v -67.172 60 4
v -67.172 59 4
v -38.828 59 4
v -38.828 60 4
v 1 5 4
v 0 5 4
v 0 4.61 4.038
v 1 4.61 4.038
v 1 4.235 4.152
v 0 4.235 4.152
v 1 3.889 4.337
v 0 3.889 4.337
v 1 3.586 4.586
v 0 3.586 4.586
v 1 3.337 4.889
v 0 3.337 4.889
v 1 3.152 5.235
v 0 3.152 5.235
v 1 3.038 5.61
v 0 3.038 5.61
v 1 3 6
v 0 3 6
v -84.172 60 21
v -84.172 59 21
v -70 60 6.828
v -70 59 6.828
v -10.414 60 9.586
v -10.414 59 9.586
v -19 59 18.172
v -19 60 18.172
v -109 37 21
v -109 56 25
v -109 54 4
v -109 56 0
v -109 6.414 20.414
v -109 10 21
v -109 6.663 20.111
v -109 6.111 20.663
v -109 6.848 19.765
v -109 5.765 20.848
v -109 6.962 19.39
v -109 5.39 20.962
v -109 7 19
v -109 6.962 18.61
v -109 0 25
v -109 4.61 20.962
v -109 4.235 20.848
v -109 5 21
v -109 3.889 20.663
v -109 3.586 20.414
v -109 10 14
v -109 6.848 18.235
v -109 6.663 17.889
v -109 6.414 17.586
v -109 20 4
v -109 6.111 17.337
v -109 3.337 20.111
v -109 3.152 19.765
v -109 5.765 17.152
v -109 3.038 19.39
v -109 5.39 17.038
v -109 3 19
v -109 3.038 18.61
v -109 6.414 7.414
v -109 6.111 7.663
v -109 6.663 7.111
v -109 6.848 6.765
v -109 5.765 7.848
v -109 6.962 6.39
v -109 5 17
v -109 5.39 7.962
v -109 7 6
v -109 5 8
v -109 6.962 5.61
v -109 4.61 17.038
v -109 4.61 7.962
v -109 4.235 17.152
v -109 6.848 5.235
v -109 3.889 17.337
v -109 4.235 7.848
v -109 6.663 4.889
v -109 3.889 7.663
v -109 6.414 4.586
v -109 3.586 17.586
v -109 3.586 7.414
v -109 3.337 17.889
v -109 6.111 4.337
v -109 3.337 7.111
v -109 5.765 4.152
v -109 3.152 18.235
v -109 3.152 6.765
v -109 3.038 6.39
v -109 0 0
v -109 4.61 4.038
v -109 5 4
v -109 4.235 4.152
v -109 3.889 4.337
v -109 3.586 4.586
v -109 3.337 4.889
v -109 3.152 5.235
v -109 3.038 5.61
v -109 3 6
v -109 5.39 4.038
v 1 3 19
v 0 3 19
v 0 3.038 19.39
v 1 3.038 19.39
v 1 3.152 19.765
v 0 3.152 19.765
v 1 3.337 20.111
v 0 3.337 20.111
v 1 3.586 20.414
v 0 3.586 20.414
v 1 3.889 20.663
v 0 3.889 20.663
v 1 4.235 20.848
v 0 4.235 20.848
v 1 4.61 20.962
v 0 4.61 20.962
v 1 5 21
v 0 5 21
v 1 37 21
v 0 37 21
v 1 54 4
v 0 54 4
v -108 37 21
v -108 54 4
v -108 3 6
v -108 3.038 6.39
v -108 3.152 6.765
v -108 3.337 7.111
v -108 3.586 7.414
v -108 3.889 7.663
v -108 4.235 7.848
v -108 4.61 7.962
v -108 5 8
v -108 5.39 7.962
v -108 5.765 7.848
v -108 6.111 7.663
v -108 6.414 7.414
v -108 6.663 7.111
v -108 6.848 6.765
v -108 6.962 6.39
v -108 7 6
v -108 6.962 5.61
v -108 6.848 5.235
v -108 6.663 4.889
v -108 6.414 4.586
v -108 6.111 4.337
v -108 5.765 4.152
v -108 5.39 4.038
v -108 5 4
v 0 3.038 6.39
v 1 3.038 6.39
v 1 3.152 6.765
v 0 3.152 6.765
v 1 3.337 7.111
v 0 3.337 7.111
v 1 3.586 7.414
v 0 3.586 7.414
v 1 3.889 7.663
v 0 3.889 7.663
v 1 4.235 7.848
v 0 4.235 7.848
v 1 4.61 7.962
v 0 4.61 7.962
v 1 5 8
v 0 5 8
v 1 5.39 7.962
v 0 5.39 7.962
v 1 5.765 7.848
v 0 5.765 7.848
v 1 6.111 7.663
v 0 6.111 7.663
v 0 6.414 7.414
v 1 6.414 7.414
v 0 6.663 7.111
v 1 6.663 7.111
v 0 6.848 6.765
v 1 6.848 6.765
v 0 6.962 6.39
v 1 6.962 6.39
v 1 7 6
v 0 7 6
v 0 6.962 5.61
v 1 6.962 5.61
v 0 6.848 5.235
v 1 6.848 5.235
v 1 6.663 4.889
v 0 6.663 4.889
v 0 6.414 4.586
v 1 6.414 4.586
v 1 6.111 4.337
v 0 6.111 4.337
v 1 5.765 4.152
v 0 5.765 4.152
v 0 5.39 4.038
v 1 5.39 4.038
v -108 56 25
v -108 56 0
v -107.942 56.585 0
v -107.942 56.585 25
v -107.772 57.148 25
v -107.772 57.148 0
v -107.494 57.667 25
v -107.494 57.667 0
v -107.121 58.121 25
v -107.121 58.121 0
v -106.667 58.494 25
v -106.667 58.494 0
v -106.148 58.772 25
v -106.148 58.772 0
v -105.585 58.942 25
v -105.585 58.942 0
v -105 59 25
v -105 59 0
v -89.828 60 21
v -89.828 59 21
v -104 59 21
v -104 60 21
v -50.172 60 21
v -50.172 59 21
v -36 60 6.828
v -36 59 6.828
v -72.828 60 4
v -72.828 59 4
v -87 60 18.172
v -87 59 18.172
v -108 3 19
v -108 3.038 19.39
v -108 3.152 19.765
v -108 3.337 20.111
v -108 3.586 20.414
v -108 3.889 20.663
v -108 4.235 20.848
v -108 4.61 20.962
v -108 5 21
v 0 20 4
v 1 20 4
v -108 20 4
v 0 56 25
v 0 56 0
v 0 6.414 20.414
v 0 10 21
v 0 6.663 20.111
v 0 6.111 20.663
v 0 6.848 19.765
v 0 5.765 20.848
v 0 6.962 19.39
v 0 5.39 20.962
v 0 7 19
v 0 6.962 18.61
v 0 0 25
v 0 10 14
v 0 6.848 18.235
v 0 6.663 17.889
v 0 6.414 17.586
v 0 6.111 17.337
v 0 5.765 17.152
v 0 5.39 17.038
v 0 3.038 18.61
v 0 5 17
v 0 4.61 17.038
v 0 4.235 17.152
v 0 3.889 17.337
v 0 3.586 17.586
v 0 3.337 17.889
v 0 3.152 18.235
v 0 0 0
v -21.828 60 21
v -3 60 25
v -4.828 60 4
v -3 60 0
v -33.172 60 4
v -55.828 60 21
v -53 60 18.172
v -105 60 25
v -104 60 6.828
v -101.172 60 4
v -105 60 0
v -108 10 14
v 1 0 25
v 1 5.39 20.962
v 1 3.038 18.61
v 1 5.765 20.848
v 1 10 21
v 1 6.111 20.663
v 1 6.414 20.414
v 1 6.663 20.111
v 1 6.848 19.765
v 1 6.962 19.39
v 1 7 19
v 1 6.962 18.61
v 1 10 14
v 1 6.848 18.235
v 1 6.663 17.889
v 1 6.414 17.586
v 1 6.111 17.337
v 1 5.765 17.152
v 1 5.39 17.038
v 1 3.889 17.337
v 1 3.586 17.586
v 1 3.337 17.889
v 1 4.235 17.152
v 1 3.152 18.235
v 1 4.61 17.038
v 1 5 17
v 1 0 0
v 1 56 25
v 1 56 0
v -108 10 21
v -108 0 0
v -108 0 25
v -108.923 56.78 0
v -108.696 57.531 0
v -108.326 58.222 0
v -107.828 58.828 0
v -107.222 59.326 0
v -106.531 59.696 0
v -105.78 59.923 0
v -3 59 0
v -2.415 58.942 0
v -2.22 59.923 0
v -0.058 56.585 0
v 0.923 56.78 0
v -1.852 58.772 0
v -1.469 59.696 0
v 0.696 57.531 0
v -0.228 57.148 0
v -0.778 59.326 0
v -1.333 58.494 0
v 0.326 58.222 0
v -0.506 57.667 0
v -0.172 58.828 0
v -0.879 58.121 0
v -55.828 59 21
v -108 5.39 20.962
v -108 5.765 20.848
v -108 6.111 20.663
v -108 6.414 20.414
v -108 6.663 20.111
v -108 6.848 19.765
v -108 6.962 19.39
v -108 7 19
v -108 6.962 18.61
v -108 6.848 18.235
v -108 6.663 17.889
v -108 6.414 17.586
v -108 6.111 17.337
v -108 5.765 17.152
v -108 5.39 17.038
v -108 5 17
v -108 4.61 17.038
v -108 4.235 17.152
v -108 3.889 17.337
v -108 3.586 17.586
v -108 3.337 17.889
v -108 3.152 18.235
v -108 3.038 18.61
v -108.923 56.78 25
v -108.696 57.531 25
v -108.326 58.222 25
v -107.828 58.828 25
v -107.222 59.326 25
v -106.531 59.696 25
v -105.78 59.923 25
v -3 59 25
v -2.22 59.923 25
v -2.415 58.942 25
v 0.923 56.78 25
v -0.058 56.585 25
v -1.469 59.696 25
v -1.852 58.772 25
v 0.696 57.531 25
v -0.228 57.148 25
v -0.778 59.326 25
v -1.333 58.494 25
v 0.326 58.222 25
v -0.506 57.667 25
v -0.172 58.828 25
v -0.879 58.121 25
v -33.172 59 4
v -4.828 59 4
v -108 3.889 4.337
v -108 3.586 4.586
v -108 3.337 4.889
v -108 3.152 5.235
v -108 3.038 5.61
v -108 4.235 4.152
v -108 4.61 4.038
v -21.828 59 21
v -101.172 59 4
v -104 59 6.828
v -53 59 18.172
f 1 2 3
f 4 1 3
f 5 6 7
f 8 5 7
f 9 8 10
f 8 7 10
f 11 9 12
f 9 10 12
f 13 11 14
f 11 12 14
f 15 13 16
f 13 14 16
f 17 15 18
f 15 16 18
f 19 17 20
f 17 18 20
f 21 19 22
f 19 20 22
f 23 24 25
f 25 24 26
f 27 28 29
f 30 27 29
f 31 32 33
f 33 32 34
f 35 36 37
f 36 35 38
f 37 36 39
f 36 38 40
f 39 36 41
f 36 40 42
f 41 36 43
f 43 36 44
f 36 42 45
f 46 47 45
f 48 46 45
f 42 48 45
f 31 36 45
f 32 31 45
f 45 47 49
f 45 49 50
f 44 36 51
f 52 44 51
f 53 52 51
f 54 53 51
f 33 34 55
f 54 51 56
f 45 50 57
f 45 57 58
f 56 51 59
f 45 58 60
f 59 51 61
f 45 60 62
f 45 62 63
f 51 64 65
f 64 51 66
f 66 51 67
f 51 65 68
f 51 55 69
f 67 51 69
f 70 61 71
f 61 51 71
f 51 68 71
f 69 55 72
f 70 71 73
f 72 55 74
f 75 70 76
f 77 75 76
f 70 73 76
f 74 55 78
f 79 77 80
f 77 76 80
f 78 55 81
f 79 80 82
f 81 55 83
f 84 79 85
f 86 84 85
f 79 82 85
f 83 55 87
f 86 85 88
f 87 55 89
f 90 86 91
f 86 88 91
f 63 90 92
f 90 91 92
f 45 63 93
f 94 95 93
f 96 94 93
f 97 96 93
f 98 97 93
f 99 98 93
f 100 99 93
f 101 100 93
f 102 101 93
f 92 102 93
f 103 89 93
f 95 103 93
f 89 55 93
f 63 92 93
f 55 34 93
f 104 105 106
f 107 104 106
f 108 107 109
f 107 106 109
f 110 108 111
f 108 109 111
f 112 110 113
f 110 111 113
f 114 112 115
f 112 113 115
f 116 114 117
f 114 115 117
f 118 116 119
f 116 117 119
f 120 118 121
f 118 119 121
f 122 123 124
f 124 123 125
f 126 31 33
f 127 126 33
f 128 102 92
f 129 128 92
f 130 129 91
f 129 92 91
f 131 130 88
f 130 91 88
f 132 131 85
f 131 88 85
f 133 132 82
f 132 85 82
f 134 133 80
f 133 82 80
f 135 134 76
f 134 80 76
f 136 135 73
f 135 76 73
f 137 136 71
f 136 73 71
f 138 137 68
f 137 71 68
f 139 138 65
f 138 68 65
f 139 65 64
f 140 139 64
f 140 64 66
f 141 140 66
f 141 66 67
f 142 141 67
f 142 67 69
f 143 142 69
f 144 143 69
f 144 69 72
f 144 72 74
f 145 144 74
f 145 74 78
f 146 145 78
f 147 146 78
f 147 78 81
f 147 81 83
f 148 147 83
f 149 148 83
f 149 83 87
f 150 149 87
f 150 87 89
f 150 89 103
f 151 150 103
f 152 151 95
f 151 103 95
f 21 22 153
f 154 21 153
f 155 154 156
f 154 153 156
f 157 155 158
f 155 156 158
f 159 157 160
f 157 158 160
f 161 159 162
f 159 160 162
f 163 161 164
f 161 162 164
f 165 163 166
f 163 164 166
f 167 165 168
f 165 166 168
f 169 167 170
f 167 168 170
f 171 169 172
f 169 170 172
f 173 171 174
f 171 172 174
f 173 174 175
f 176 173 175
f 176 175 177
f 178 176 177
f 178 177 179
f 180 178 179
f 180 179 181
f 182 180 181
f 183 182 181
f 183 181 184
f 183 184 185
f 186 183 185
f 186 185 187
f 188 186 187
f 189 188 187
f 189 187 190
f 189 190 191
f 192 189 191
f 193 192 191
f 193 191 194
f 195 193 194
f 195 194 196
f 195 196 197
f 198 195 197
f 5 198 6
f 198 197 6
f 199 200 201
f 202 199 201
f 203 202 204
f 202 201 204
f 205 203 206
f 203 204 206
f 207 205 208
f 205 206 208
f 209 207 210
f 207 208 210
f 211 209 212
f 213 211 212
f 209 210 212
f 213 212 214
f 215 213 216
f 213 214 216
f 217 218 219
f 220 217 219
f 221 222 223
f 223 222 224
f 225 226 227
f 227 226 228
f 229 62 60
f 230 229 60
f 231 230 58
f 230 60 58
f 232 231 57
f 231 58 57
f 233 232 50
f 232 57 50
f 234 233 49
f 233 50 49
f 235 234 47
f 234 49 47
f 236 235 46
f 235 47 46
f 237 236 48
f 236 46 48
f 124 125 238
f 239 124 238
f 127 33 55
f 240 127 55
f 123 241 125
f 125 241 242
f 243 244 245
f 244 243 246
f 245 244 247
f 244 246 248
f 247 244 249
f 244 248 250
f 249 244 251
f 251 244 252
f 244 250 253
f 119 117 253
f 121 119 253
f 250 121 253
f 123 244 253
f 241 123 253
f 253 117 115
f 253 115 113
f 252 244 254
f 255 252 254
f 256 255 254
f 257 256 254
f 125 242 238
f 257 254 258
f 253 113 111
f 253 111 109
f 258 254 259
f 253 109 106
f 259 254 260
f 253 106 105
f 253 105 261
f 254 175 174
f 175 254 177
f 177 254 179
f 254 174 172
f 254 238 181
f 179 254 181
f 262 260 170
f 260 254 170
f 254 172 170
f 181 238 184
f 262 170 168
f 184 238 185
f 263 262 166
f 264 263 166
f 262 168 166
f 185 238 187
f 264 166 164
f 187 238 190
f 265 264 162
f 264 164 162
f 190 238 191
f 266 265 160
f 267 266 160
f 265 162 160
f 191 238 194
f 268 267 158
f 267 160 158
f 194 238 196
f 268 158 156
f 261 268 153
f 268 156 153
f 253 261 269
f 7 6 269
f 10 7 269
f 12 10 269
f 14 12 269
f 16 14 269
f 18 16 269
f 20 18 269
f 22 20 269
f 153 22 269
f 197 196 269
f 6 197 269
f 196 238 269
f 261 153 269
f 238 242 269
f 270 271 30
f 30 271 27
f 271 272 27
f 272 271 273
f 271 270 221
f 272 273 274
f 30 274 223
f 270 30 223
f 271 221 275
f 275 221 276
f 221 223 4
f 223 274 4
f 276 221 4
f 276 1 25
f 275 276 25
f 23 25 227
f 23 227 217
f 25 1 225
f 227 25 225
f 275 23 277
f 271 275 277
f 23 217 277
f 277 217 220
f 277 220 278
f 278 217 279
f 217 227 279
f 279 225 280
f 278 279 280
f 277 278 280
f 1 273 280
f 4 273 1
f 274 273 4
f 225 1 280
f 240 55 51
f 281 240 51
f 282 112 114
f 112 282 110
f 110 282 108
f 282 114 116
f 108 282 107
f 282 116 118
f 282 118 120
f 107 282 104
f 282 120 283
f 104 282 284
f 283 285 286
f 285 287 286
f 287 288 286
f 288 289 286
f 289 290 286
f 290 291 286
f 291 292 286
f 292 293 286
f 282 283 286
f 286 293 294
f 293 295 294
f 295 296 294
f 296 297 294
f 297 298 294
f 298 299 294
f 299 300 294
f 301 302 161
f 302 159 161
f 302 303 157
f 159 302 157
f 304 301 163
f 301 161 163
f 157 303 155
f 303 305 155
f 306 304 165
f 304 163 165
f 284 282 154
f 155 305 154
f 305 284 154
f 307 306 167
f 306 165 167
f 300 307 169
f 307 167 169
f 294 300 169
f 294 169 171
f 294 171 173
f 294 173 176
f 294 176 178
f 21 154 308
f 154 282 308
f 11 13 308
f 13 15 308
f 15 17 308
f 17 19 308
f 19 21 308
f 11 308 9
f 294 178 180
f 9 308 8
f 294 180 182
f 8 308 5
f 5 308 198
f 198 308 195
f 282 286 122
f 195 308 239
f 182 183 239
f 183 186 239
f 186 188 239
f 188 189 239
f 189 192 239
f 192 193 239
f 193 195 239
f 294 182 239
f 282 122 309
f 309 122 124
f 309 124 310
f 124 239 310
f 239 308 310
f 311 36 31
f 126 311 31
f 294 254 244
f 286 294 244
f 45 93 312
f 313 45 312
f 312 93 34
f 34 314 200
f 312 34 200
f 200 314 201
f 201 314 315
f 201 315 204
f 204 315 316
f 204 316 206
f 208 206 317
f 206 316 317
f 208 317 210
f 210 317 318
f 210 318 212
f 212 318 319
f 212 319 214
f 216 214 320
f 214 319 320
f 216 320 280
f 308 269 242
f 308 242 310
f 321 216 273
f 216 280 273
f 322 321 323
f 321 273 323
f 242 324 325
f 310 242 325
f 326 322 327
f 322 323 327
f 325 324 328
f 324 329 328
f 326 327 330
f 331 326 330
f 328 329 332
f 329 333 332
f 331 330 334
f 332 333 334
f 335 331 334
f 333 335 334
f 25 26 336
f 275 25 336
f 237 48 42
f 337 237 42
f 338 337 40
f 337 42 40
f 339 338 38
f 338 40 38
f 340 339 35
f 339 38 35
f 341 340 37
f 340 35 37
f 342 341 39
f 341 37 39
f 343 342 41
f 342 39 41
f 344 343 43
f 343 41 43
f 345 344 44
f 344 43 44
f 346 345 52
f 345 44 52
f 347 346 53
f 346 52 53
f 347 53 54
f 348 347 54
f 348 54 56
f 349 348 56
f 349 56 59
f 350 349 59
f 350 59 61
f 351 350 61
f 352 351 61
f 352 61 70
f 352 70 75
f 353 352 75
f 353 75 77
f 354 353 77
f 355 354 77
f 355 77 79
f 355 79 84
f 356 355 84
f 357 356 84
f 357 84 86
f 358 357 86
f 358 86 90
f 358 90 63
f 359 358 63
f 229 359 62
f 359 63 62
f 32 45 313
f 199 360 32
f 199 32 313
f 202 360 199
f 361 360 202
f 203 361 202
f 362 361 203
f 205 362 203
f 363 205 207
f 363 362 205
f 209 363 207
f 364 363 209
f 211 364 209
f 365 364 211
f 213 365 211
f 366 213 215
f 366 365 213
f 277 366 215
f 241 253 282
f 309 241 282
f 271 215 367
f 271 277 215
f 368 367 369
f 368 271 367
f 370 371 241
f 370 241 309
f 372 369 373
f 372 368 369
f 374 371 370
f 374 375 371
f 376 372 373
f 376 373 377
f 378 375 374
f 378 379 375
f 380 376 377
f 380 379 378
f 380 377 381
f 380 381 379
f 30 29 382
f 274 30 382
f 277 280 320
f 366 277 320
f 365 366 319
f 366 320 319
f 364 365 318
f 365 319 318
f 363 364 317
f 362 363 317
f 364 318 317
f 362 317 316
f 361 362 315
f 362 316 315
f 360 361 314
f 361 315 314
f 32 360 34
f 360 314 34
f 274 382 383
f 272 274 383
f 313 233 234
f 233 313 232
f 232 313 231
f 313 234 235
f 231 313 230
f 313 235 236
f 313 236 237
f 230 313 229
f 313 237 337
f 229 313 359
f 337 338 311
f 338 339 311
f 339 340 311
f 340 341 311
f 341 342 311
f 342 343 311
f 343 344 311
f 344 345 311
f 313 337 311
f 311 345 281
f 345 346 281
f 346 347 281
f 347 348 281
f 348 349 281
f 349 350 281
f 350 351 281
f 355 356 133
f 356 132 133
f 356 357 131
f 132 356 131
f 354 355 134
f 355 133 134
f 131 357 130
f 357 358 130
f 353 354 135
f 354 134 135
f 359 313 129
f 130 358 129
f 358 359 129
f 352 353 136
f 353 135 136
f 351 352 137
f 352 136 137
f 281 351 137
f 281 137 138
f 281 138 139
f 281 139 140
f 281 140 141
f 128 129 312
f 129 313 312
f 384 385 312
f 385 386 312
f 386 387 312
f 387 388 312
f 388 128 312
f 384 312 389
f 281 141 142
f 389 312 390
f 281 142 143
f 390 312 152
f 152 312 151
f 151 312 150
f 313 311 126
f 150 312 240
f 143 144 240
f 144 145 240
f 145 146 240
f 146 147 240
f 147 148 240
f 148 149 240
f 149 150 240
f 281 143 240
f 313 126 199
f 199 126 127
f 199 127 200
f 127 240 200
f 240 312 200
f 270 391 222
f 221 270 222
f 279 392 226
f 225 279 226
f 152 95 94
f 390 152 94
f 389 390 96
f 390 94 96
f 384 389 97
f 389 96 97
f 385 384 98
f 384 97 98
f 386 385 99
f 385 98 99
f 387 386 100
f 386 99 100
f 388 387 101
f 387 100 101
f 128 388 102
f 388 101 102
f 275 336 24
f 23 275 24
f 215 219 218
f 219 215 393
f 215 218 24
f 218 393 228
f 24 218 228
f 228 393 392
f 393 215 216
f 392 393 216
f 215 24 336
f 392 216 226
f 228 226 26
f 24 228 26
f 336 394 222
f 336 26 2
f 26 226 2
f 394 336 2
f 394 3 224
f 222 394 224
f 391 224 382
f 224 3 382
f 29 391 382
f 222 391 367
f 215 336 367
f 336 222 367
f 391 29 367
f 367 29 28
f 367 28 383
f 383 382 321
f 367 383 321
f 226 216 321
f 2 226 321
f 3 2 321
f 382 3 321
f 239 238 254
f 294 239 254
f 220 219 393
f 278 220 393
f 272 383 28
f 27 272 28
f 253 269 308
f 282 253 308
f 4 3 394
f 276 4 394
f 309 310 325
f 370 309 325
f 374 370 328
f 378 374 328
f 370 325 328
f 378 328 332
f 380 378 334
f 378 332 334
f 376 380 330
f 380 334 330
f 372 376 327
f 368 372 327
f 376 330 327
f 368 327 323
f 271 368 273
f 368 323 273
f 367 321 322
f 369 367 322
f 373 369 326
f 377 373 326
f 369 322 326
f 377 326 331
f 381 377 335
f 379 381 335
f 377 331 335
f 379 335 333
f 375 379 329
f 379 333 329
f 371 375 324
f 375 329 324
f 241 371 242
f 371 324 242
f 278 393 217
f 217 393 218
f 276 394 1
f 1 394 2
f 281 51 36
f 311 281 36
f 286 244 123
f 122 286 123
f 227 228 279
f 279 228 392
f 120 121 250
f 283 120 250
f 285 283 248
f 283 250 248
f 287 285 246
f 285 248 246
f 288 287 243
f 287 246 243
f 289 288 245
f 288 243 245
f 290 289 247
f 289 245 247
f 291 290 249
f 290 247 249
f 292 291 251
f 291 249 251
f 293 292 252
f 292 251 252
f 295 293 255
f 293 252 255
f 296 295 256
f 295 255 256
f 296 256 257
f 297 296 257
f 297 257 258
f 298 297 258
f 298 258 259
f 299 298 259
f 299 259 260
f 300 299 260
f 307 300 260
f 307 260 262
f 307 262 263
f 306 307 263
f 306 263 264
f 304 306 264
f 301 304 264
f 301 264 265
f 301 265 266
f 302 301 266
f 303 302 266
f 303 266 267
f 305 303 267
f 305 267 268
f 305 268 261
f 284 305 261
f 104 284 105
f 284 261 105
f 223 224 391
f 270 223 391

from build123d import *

# Parameters (mm, degrees)
F1_DEPTH = 25
F3_DEPTH = 25
F5_DEPTH = 200


with BuildPart() as f1:
    # F0 (on Top) → F1 (new body)
    with BuildSketch(Plane.XY):
        with BuildLine():
            Line((0, 56), (0, 0))
            Line((0, 0), (1, 0))
            Line((1, 0), (1, 56))
            ThreePointArc((1, 56), (-0.1715728753, 58.8284271247), (-3, 60))
            Line((-3, 60), (-105, 60))
            ThreePointArc((-105, 60), (-107.8284271247, 58.8284271247), (-109, 56))
            Line((-109, 56), (-109, 0))
            Line((-109, 0), (-108, 0))
            Line((-108, 0), (-108, 56))
            ThreePointArc((-108, 56), (-107.1213203436, 58.1213203436), (-105, 59))
            Line((-105, 59), (-3, 59))
            ThreePointArc((-3, 59), (-0.8786796564, 58.1213203436), (0, 56))
        make_face()
    extrude(amount=F1_DEPTH)

    # F2 (on face) → F3 (cut)
    with BuildSketch(Plane.XZ.offset(-59)):
        Polygon((-55.8284271247, 21), (-84.1715728753, 21), (-70, 6.8284271247), align=None)
        Polygon((-36, 6.8284271247), (-21.8284271247, 21), (-50.1715728753, 21), align=None)
        Polygon((-101.1715728753, 4), (-72.8284271247, 4), (-87, 18.1715728753), align=None)
        Polygon((-104, 21), (-104, 6.8284271247), (-89.8284271247, 21), align=None)
        Polygon((-67.1715728753, 4), (-38.8284271247, 4), (-53, 18.1715728753), align=None)
        Polygon((-10.4142135624, 9.5857864376), (-19, 18.1715728753), (-33.1715728753, 4), (-4.8284271247, 4), align=None)
    extrude(amount=-F3_DEPTH, mode=Mode.SUBTRACT)

    # F4 (on face) → F5 (cut)
    with BuildSketch(Plane(origin=(-109, 0, 0), x_dir=(0, -1, 0), z_dir=(-1, 0, 0))):
        with BuildLine():
            ThreePointArc((-5, 21), (-6.4142135624, 17.5857864376), (-3, 19))
            ThreePointArc((-3, 19), (-3.5857864376, 20.4142135624), (-5, 21))
        make_face()
        with BuildLine():
            ThreePointArc((-3, 6), (-6.4142135624, 7.4142135624), (-5, 4))
            ThreePointArc((-5, 4), (-3.5857864376, 4.5857864376), (-3, 6))
        make_face()
        Polygon((-10, 14), (-10, 21), (-37, 21), (-20, 4), align=None)
        Polygon((-20, 4), (-37, 21), (-54, 4), align=None)
    extrude(amount=-F5_DEPTH, mode=Mode.SUBTRACT)


solid = f1.part
